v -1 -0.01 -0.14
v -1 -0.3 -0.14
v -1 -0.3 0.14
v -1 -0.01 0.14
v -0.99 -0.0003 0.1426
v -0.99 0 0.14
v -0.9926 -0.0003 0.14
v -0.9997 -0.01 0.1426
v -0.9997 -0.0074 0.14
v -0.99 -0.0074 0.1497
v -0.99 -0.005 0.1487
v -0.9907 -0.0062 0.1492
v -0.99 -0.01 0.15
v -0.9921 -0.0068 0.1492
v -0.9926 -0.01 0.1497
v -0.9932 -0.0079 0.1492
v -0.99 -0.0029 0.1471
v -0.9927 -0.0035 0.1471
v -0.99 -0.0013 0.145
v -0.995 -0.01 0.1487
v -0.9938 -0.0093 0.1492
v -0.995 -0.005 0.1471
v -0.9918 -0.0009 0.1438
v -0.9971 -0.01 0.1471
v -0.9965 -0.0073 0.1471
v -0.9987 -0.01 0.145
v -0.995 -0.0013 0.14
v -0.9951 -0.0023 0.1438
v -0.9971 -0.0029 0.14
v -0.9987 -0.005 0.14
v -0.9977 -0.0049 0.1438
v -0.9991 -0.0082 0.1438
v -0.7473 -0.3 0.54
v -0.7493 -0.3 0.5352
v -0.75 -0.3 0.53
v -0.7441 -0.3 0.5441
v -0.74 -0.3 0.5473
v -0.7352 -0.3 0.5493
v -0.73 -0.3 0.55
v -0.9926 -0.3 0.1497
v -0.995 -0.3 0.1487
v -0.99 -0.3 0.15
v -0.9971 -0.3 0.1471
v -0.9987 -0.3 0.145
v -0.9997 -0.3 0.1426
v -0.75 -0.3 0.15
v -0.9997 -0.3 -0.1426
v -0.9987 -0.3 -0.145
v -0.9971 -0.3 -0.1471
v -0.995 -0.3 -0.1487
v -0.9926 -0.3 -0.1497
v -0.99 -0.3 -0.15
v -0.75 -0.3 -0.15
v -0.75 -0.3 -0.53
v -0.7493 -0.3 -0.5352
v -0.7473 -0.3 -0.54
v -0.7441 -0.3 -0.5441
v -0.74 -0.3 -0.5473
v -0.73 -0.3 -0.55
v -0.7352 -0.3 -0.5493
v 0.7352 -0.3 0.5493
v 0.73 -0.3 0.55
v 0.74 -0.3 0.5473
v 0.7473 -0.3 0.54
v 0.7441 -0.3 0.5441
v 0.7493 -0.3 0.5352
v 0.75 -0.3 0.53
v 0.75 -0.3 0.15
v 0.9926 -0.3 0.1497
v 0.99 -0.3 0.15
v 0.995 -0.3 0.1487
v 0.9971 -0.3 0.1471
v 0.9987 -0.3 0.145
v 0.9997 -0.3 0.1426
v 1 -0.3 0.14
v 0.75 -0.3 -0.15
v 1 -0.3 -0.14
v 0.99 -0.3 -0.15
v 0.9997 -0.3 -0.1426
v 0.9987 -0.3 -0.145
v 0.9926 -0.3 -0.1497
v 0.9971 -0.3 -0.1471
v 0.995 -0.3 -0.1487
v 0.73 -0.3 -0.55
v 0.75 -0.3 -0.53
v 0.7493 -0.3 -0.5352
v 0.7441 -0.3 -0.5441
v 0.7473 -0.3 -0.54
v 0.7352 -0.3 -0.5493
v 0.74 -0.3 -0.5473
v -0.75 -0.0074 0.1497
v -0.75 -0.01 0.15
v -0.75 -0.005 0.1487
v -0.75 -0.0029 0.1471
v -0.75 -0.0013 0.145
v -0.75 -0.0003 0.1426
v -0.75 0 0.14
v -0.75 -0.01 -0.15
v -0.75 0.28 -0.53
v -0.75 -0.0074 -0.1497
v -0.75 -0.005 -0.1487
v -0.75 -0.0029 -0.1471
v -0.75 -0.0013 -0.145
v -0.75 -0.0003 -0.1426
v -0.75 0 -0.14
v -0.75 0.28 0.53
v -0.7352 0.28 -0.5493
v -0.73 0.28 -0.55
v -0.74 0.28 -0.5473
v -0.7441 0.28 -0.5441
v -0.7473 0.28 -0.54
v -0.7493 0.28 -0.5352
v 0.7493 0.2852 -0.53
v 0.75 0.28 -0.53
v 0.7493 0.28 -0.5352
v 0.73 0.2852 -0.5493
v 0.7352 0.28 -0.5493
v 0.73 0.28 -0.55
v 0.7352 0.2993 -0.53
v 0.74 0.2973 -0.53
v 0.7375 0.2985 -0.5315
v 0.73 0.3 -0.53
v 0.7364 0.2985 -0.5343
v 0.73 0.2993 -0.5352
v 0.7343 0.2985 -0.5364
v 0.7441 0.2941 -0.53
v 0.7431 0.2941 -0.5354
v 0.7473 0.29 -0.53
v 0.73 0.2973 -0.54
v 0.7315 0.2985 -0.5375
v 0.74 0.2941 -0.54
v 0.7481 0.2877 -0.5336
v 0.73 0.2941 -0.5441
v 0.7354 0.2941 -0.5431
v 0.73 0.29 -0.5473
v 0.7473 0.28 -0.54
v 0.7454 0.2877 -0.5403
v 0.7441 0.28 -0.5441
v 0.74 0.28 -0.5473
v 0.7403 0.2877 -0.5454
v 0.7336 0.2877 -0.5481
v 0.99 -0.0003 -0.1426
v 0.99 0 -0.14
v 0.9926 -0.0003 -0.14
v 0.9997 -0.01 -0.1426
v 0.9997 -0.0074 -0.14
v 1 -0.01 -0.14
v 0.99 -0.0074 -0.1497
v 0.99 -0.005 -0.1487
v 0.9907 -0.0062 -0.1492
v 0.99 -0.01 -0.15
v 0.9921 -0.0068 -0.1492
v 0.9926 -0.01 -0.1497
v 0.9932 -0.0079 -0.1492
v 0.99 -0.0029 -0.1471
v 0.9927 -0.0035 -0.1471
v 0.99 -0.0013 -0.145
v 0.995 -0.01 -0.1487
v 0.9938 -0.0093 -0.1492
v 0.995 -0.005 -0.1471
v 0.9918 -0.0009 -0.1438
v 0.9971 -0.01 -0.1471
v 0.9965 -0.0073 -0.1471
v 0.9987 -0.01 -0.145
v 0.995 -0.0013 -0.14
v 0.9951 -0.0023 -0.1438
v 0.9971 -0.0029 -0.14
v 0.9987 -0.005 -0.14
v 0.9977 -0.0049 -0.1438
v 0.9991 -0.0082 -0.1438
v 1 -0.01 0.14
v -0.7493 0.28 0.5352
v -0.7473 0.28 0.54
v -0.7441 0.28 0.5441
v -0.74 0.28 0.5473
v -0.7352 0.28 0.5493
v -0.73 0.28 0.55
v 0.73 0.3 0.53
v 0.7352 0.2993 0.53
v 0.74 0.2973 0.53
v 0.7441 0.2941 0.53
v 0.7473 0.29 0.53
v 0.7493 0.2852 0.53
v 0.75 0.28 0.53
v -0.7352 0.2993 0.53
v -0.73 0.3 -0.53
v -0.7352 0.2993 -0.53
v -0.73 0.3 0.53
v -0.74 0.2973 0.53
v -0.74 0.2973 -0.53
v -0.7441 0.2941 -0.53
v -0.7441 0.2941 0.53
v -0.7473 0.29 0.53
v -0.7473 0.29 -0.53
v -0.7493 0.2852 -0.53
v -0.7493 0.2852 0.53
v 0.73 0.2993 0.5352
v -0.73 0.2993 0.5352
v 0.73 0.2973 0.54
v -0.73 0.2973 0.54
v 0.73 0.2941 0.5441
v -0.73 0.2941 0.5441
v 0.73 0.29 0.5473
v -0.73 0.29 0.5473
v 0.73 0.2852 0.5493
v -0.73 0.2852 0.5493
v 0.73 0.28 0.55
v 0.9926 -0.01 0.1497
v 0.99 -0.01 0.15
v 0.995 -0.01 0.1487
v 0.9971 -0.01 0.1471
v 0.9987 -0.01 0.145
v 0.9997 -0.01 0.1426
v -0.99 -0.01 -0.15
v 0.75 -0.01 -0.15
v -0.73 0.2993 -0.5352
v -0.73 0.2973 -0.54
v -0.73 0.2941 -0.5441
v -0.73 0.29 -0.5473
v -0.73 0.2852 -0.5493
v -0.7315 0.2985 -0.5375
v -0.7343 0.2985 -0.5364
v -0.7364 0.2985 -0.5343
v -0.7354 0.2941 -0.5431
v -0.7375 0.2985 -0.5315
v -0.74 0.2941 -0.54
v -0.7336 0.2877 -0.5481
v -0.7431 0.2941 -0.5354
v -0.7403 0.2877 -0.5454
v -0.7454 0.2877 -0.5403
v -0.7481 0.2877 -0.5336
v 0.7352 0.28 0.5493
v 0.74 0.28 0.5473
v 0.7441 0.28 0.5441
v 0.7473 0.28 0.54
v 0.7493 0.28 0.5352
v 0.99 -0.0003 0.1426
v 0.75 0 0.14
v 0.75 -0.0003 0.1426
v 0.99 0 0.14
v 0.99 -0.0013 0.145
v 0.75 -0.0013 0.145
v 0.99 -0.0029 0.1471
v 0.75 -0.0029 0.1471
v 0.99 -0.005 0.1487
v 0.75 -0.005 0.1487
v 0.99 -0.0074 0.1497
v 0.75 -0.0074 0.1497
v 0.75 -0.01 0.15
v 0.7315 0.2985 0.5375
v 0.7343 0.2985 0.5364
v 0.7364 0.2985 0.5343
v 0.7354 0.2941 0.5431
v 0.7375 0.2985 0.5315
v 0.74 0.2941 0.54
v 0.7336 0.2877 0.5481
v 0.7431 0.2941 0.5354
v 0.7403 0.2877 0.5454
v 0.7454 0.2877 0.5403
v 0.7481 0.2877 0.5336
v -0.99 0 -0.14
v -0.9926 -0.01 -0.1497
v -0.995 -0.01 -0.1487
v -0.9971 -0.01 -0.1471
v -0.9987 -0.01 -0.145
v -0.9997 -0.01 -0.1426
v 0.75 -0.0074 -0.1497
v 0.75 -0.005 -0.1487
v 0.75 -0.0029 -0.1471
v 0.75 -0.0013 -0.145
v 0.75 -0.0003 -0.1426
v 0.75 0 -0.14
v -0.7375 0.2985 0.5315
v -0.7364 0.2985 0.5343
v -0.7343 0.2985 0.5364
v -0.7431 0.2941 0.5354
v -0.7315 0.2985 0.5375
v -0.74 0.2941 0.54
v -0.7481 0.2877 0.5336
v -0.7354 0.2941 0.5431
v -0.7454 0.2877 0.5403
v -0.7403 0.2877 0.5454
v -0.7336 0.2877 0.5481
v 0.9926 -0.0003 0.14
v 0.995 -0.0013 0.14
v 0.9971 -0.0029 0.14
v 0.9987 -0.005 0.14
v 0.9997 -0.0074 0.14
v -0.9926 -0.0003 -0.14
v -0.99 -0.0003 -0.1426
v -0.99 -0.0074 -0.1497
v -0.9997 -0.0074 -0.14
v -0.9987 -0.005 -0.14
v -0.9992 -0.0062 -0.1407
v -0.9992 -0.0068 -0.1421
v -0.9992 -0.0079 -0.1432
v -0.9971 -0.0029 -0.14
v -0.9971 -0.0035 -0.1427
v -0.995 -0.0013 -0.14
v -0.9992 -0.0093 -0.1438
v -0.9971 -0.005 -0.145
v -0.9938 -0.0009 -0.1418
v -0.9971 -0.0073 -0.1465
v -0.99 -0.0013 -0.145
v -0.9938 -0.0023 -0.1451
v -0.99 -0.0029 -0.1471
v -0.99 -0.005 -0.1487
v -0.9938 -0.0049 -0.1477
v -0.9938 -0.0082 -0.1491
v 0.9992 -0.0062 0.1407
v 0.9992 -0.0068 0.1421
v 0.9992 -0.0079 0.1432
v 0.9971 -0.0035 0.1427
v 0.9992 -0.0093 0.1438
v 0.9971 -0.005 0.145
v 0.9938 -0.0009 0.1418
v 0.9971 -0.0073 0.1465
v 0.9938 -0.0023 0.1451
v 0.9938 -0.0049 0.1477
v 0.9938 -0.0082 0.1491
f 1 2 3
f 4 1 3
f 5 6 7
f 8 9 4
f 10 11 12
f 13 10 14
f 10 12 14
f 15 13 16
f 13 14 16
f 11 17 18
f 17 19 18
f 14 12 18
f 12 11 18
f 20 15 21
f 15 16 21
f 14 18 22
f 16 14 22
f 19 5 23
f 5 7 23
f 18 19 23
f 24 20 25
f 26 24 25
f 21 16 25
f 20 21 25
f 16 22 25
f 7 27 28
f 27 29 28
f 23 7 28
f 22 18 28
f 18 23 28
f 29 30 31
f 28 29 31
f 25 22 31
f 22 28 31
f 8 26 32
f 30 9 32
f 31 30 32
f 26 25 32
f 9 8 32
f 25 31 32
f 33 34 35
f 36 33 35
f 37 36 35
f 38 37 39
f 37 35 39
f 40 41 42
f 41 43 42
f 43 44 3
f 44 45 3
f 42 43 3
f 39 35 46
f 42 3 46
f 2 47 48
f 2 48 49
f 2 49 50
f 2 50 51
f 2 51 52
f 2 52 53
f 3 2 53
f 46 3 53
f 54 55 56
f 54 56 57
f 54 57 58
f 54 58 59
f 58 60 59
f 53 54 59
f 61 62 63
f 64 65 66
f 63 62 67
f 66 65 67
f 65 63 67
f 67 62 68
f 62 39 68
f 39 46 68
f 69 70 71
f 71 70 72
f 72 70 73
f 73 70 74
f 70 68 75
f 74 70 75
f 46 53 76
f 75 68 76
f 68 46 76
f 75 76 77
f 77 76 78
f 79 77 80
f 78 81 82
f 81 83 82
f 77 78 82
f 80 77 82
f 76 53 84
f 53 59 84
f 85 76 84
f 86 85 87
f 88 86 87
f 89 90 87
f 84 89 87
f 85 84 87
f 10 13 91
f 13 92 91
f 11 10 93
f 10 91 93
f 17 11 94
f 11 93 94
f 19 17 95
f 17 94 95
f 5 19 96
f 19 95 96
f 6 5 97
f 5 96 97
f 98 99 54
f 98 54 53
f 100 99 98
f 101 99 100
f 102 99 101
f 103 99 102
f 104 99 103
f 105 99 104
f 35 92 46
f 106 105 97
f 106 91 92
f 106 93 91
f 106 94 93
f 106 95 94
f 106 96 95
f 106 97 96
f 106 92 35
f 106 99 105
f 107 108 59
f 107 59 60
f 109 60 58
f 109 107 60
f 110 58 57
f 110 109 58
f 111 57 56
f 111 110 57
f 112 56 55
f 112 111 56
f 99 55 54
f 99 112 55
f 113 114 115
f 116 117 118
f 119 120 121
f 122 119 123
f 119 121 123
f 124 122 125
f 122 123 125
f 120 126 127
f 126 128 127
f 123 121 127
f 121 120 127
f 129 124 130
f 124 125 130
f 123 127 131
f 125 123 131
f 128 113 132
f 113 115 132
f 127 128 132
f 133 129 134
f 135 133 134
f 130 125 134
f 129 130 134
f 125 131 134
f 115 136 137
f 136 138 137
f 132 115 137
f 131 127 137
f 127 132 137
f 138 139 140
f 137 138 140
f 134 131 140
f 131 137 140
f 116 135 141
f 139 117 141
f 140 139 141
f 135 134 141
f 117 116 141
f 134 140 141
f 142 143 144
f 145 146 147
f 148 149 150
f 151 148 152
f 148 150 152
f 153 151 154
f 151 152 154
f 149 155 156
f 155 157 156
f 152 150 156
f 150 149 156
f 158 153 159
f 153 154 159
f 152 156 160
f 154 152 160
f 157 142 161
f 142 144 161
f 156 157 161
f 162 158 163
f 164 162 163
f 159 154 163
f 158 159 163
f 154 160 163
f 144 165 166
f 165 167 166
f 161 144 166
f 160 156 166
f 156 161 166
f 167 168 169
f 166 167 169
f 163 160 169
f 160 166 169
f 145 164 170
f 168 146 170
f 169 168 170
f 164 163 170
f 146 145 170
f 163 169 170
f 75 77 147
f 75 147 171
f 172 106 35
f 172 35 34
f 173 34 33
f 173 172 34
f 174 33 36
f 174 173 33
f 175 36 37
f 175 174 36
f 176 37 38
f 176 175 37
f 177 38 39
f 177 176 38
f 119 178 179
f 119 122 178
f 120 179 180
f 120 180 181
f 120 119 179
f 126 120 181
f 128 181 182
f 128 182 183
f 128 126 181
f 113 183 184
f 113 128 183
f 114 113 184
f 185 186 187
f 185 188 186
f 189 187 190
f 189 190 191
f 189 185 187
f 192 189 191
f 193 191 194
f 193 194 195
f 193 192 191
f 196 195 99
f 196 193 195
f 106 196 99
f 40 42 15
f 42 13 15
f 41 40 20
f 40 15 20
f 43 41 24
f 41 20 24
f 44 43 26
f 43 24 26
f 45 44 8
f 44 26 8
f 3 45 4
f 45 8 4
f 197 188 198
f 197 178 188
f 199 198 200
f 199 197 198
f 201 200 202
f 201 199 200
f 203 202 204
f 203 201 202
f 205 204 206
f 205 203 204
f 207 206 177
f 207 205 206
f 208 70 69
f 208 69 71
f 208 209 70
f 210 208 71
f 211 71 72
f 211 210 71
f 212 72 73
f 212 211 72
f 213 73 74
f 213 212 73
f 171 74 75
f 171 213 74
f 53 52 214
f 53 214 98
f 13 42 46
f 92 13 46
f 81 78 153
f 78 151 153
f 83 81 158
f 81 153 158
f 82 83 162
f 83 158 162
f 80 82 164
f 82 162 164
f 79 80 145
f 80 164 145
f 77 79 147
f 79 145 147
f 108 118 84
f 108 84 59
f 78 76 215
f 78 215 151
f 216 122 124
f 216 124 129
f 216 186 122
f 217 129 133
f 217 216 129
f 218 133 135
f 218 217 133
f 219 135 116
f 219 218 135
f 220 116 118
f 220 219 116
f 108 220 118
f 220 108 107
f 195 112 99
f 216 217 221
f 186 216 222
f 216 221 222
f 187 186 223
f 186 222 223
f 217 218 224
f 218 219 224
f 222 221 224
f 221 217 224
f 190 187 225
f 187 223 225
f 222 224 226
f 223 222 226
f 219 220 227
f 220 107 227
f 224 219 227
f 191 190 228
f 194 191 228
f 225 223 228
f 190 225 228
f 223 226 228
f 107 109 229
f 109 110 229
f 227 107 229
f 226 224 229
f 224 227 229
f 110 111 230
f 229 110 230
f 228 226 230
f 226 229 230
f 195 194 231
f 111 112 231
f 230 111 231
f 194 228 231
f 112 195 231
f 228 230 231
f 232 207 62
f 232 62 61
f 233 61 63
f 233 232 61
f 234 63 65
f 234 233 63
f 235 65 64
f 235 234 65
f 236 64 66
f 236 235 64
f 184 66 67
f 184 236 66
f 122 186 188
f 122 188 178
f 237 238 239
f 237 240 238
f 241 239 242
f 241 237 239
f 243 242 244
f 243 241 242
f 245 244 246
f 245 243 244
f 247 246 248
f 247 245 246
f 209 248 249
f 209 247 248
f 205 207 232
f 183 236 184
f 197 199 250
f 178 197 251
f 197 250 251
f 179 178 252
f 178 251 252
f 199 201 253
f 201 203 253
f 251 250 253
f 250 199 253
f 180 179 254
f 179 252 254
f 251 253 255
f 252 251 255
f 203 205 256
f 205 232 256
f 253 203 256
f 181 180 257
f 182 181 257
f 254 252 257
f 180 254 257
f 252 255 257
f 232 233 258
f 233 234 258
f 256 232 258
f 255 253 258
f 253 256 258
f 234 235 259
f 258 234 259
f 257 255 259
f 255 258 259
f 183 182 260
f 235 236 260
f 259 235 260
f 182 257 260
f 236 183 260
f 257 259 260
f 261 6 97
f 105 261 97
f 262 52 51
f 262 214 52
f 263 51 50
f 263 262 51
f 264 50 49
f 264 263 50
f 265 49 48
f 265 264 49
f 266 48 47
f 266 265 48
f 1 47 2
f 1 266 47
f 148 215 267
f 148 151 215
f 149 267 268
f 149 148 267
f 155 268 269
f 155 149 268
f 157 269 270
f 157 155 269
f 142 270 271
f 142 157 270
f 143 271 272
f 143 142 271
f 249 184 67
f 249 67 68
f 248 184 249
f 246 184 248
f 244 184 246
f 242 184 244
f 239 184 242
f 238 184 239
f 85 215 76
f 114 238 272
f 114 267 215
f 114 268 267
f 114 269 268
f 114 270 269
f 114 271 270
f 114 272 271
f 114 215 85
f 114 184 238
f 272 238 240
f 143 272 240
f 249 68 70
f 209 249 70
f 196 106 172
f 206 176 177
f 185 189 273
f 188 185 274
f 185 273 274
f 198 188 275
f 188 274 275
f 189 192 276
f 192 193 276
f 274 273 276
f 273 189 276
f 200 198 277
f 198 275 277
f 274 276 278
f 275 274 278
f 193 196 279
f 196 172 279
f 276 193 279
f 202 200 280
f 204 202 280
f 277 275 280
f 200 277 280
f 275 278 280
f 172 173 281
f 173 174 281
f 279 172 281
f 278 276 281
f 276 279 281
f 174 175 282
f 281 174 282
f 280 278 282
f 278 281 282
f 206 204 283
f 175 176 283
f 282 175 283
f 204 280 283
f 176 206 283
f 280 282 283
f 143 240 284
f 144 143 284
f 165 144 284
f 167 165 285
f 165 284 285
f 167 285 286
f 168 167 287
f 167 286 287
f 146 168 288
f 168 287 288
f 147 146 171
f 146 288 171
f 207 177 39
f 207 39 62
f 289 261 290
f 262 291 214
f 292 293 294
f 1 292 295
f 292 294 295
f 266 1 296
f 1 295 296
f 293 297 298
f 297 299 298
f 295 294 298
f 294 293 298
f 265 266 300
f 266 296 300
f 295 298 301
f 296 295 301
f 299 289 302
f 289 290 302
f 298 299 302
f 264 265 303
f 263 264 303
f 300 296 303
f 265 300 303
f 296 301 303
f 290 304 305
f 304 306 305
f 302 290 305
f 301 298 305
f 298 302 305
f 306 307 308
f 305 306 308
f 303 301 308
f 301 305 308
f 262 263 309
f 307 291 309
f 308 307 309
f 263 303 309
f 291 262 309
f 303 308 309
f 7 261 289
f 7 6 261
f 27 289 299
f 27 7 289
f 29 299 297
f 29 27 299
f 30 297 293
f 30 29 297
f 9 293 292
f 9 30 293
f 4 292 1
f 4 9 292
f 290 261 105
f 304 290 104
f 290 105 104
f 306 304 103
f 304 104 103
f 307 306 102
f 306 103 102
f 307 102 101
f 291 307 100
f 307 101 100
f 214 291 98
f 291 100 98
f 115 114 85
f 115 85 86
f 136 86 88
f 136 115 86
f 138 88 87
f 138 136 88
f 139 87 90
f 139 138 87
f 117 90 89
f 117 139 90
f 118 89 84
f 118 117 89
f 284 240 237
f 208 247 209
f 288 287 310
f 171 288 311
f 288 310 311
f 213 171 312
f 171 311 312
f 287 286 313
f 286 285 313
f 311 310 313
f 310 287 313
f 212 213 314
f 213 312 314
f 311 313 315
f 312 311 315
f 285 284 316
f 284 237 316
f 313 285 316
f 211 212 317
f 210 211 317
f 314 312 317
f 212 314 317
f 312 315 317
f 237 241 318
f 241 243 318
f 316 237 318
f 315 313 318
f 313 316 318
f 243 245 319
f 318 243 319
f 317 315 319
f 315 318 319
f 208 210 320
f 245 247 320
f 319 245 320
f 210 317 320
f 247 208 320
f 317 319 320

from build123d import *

# Parameters (mm, degrees)
BOSS_EXTRUDE1_DEPTH = 0.3
FILLET1_R           = 0.02
SKETCH2_W           = 0.25
SKETCH2_H           = 0.3
BOSS_EXTRUDE2_DEPTH = 0.3
FILLET2_R           = 0.01


with BuildPart() as part:
    # Sketch1 → Boss-Extrude1 (new, symmetric)
    with BuildSketch(Plane(origin=(0, 0, 0), x_dir=(1, 0, 0), z_dir=(0, 1, 0))):
        with BuildLine():
            Line((-0.73, -0.55), (0.73, -0.55))
            ThreePointArc((0.73, -0.55), (0.744142136, -0.544142136), (0.75, -0.53))
            Line((0.75, -0.53), (0.75, 0.53))
            ThreePointArc((0.75, 0.53), (0.744142136, 0.544142136), (0.73, 0.55))
            Line((0.73, 0.55), (-0.73, 0.55))
            ThreePointArc((-0.73, 0.55), (-0.744142136, 0.544142136), (-0.75, 0.53))
            Line((-0.75, 0.53), (-0.75, -0.53))
            ThreePointArc((-0.75, -0.53), (-0.744142136, -0.544142136), (-0.73, -0.55))
        make_face()
    extrude(amount=BOSS_EXTRUDE1_DEPTH, both=True)

    # Fillet1
    fillet1_edges = [part.edges().sort_by_distance(p)[0] for p in [
        (0.744142136, 0.3, 0.544142136),
        (0.75, 0.3, 0),
        (0.744142136, 0.3, -0.544142136),
        (0, 0.3, -0.55),
        (-0.744142136, 0.3, -0.544142136),
        (-0.75, 0.3, 0),
        (-0.744142136, 0.3, 0.544142136),
        (0, 0.3, 0.55),
    ]]
    fillet(fillet1_edges, radius=FILLET1_R)

    # Sketch2 → Boss-Extrude2 (add)
    with BuildSketch(Plane.XZ.offset(0.3)):
        with Locations((-0.875, 0)):
            Rectangle(SKETCH2_W, SKETCH2_H)
        with Locations((0.875, 0)):
            Rectangle(SKETCH2_W, SKETCH2_H)
    extrude(amount=-BOSS_EXTRUDE2_DEPTH)

    # Fillet2
    fillet2_edges = [part.edges().sort_by_distance(p)[0] for p in [
        (-0.875, 0, -0.15),
        (-1, 0, 0),
        (-1, -0.15, -0.15),
        (-0.875, 0, 0.15),
        (-1, -0.15, 0.15),
        (0.875, 0, 0.15),
        (1, 0, 0),
        (1, -0.15, 0.15),
        (0.875, 0, -0.15),
        (1, -0.15, -0.15),
    ]]
    fillet(fillet2_edges, radius=FILLET2_R)


solid = part.part
